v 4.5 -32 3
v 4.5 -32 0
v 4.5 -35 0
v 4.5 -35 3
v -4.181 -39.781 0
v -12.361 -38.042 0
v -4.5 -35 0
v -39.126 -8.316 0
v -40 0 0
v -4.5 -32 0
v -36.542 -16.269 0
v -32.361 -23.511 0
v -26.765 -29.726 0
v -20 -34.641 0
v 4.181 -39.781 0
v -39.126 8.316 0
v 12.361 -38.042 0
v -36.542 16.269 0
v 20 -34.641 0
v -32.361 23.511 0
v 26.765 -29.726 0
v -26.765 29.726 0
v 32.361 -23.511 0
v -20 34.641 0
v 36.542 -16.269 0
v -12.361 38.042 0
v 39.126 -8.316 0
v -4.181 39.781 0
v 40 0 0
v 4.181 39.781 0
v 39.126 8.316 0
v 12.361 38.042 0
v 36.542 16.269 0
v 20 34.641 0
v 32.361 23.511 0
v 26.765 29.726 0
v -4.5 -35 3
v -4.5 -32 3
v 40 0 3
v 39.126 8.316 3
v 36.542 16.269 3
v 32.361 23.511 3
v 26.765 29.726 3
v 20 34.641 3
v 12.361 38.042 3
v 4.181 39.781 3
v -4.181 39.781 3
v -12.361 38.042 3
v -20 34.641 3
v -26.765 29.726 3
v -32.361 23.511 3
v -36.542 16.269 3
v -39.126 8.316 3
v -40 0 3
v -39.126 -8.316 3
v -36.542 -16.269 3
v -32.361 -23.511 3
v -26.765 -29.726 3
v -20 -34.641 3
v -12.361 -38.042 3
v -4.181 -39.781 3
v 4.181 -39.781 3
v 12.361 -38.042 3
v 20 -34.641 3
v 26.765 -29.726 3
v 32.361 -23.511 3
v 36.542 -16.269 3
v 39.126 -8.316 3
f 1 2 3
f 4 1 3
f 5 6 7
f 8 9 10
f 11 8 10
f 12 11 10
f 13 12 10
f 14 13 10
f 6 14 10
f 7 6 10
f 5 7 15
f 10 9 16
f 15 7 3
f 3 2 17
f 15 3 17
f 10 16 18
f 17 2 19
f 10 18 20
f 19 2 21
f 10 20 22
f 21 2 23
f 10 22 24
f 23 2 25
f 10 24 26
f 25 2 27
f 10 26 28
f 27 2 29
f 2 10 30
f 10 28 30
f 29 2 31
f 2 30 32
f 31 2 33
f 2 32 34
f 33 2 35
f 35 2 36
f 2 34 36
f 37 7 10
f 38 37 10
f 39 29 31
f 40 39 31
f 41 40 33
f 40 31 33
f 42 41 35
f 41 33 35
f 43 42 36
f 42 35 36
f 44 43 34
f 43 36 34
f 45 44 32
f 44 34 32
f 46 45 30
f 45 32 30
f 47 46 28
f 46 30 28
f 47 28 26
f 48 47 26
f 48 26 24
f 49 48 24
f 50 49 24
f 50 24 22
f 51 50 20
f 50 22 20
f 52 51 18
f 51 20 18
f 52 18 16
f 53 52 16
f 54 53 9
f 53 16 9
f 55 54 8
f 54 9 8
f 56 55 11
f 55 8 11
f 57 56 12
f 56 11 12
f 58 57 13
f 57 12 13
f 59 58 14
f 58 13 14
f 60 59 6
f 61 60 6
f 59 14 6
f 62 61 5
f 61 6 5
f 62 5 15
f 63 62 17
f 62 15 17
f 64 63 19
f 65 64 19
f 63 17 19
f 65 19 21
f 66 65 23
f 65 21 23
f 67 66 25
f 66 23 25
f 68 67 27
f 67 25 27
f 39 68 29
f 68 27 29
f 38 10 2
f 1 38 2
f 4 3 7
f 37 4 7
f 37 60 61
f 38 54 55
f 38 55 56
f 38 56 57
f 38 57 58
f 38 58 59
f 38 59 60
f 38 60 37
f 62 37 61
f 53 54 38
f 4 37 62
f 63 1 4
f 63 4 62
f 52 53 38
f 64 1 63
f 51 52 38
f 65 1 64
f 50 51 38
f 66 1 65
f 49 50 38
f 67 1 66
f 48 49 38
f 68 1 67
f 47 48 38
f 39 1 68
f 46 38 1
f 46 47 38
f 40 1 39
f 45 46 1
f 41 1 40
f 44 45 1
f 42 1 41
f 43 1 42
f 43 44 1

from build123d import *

# Parameters (mm, degrees)
SKETCH1_R           = 40
BOSS_EXTRUDE1_DEPTH = 3
CUT_EXTRUDE1_DEPTH  = 3


with BuildPart() as part:
    # Sketch1 → Boss-Extrude1 (new body)
    with BuildSketch(Plane.XY):
        Circle(SKETCH1_R)
    extrude(amount=BOSS_EXTRUDE1_DEPTH)

    # Sketch2 → Cut-Extrude1 (cut)
    with BuildSketch(Plane(origin=(0, 0, 0), x_dir=(-1, 0, 0), z_dir=(0, 0, -1))):
        Polygon((0, -35), (4.5, -35), (4.5, -32), (-4.5, -32), (-4.5, -35), align=None)
    extrude(amount=-CUT_EXTRUDE1_DEPTH, mode=Mode.SUBTRACT)


solid = part.part
